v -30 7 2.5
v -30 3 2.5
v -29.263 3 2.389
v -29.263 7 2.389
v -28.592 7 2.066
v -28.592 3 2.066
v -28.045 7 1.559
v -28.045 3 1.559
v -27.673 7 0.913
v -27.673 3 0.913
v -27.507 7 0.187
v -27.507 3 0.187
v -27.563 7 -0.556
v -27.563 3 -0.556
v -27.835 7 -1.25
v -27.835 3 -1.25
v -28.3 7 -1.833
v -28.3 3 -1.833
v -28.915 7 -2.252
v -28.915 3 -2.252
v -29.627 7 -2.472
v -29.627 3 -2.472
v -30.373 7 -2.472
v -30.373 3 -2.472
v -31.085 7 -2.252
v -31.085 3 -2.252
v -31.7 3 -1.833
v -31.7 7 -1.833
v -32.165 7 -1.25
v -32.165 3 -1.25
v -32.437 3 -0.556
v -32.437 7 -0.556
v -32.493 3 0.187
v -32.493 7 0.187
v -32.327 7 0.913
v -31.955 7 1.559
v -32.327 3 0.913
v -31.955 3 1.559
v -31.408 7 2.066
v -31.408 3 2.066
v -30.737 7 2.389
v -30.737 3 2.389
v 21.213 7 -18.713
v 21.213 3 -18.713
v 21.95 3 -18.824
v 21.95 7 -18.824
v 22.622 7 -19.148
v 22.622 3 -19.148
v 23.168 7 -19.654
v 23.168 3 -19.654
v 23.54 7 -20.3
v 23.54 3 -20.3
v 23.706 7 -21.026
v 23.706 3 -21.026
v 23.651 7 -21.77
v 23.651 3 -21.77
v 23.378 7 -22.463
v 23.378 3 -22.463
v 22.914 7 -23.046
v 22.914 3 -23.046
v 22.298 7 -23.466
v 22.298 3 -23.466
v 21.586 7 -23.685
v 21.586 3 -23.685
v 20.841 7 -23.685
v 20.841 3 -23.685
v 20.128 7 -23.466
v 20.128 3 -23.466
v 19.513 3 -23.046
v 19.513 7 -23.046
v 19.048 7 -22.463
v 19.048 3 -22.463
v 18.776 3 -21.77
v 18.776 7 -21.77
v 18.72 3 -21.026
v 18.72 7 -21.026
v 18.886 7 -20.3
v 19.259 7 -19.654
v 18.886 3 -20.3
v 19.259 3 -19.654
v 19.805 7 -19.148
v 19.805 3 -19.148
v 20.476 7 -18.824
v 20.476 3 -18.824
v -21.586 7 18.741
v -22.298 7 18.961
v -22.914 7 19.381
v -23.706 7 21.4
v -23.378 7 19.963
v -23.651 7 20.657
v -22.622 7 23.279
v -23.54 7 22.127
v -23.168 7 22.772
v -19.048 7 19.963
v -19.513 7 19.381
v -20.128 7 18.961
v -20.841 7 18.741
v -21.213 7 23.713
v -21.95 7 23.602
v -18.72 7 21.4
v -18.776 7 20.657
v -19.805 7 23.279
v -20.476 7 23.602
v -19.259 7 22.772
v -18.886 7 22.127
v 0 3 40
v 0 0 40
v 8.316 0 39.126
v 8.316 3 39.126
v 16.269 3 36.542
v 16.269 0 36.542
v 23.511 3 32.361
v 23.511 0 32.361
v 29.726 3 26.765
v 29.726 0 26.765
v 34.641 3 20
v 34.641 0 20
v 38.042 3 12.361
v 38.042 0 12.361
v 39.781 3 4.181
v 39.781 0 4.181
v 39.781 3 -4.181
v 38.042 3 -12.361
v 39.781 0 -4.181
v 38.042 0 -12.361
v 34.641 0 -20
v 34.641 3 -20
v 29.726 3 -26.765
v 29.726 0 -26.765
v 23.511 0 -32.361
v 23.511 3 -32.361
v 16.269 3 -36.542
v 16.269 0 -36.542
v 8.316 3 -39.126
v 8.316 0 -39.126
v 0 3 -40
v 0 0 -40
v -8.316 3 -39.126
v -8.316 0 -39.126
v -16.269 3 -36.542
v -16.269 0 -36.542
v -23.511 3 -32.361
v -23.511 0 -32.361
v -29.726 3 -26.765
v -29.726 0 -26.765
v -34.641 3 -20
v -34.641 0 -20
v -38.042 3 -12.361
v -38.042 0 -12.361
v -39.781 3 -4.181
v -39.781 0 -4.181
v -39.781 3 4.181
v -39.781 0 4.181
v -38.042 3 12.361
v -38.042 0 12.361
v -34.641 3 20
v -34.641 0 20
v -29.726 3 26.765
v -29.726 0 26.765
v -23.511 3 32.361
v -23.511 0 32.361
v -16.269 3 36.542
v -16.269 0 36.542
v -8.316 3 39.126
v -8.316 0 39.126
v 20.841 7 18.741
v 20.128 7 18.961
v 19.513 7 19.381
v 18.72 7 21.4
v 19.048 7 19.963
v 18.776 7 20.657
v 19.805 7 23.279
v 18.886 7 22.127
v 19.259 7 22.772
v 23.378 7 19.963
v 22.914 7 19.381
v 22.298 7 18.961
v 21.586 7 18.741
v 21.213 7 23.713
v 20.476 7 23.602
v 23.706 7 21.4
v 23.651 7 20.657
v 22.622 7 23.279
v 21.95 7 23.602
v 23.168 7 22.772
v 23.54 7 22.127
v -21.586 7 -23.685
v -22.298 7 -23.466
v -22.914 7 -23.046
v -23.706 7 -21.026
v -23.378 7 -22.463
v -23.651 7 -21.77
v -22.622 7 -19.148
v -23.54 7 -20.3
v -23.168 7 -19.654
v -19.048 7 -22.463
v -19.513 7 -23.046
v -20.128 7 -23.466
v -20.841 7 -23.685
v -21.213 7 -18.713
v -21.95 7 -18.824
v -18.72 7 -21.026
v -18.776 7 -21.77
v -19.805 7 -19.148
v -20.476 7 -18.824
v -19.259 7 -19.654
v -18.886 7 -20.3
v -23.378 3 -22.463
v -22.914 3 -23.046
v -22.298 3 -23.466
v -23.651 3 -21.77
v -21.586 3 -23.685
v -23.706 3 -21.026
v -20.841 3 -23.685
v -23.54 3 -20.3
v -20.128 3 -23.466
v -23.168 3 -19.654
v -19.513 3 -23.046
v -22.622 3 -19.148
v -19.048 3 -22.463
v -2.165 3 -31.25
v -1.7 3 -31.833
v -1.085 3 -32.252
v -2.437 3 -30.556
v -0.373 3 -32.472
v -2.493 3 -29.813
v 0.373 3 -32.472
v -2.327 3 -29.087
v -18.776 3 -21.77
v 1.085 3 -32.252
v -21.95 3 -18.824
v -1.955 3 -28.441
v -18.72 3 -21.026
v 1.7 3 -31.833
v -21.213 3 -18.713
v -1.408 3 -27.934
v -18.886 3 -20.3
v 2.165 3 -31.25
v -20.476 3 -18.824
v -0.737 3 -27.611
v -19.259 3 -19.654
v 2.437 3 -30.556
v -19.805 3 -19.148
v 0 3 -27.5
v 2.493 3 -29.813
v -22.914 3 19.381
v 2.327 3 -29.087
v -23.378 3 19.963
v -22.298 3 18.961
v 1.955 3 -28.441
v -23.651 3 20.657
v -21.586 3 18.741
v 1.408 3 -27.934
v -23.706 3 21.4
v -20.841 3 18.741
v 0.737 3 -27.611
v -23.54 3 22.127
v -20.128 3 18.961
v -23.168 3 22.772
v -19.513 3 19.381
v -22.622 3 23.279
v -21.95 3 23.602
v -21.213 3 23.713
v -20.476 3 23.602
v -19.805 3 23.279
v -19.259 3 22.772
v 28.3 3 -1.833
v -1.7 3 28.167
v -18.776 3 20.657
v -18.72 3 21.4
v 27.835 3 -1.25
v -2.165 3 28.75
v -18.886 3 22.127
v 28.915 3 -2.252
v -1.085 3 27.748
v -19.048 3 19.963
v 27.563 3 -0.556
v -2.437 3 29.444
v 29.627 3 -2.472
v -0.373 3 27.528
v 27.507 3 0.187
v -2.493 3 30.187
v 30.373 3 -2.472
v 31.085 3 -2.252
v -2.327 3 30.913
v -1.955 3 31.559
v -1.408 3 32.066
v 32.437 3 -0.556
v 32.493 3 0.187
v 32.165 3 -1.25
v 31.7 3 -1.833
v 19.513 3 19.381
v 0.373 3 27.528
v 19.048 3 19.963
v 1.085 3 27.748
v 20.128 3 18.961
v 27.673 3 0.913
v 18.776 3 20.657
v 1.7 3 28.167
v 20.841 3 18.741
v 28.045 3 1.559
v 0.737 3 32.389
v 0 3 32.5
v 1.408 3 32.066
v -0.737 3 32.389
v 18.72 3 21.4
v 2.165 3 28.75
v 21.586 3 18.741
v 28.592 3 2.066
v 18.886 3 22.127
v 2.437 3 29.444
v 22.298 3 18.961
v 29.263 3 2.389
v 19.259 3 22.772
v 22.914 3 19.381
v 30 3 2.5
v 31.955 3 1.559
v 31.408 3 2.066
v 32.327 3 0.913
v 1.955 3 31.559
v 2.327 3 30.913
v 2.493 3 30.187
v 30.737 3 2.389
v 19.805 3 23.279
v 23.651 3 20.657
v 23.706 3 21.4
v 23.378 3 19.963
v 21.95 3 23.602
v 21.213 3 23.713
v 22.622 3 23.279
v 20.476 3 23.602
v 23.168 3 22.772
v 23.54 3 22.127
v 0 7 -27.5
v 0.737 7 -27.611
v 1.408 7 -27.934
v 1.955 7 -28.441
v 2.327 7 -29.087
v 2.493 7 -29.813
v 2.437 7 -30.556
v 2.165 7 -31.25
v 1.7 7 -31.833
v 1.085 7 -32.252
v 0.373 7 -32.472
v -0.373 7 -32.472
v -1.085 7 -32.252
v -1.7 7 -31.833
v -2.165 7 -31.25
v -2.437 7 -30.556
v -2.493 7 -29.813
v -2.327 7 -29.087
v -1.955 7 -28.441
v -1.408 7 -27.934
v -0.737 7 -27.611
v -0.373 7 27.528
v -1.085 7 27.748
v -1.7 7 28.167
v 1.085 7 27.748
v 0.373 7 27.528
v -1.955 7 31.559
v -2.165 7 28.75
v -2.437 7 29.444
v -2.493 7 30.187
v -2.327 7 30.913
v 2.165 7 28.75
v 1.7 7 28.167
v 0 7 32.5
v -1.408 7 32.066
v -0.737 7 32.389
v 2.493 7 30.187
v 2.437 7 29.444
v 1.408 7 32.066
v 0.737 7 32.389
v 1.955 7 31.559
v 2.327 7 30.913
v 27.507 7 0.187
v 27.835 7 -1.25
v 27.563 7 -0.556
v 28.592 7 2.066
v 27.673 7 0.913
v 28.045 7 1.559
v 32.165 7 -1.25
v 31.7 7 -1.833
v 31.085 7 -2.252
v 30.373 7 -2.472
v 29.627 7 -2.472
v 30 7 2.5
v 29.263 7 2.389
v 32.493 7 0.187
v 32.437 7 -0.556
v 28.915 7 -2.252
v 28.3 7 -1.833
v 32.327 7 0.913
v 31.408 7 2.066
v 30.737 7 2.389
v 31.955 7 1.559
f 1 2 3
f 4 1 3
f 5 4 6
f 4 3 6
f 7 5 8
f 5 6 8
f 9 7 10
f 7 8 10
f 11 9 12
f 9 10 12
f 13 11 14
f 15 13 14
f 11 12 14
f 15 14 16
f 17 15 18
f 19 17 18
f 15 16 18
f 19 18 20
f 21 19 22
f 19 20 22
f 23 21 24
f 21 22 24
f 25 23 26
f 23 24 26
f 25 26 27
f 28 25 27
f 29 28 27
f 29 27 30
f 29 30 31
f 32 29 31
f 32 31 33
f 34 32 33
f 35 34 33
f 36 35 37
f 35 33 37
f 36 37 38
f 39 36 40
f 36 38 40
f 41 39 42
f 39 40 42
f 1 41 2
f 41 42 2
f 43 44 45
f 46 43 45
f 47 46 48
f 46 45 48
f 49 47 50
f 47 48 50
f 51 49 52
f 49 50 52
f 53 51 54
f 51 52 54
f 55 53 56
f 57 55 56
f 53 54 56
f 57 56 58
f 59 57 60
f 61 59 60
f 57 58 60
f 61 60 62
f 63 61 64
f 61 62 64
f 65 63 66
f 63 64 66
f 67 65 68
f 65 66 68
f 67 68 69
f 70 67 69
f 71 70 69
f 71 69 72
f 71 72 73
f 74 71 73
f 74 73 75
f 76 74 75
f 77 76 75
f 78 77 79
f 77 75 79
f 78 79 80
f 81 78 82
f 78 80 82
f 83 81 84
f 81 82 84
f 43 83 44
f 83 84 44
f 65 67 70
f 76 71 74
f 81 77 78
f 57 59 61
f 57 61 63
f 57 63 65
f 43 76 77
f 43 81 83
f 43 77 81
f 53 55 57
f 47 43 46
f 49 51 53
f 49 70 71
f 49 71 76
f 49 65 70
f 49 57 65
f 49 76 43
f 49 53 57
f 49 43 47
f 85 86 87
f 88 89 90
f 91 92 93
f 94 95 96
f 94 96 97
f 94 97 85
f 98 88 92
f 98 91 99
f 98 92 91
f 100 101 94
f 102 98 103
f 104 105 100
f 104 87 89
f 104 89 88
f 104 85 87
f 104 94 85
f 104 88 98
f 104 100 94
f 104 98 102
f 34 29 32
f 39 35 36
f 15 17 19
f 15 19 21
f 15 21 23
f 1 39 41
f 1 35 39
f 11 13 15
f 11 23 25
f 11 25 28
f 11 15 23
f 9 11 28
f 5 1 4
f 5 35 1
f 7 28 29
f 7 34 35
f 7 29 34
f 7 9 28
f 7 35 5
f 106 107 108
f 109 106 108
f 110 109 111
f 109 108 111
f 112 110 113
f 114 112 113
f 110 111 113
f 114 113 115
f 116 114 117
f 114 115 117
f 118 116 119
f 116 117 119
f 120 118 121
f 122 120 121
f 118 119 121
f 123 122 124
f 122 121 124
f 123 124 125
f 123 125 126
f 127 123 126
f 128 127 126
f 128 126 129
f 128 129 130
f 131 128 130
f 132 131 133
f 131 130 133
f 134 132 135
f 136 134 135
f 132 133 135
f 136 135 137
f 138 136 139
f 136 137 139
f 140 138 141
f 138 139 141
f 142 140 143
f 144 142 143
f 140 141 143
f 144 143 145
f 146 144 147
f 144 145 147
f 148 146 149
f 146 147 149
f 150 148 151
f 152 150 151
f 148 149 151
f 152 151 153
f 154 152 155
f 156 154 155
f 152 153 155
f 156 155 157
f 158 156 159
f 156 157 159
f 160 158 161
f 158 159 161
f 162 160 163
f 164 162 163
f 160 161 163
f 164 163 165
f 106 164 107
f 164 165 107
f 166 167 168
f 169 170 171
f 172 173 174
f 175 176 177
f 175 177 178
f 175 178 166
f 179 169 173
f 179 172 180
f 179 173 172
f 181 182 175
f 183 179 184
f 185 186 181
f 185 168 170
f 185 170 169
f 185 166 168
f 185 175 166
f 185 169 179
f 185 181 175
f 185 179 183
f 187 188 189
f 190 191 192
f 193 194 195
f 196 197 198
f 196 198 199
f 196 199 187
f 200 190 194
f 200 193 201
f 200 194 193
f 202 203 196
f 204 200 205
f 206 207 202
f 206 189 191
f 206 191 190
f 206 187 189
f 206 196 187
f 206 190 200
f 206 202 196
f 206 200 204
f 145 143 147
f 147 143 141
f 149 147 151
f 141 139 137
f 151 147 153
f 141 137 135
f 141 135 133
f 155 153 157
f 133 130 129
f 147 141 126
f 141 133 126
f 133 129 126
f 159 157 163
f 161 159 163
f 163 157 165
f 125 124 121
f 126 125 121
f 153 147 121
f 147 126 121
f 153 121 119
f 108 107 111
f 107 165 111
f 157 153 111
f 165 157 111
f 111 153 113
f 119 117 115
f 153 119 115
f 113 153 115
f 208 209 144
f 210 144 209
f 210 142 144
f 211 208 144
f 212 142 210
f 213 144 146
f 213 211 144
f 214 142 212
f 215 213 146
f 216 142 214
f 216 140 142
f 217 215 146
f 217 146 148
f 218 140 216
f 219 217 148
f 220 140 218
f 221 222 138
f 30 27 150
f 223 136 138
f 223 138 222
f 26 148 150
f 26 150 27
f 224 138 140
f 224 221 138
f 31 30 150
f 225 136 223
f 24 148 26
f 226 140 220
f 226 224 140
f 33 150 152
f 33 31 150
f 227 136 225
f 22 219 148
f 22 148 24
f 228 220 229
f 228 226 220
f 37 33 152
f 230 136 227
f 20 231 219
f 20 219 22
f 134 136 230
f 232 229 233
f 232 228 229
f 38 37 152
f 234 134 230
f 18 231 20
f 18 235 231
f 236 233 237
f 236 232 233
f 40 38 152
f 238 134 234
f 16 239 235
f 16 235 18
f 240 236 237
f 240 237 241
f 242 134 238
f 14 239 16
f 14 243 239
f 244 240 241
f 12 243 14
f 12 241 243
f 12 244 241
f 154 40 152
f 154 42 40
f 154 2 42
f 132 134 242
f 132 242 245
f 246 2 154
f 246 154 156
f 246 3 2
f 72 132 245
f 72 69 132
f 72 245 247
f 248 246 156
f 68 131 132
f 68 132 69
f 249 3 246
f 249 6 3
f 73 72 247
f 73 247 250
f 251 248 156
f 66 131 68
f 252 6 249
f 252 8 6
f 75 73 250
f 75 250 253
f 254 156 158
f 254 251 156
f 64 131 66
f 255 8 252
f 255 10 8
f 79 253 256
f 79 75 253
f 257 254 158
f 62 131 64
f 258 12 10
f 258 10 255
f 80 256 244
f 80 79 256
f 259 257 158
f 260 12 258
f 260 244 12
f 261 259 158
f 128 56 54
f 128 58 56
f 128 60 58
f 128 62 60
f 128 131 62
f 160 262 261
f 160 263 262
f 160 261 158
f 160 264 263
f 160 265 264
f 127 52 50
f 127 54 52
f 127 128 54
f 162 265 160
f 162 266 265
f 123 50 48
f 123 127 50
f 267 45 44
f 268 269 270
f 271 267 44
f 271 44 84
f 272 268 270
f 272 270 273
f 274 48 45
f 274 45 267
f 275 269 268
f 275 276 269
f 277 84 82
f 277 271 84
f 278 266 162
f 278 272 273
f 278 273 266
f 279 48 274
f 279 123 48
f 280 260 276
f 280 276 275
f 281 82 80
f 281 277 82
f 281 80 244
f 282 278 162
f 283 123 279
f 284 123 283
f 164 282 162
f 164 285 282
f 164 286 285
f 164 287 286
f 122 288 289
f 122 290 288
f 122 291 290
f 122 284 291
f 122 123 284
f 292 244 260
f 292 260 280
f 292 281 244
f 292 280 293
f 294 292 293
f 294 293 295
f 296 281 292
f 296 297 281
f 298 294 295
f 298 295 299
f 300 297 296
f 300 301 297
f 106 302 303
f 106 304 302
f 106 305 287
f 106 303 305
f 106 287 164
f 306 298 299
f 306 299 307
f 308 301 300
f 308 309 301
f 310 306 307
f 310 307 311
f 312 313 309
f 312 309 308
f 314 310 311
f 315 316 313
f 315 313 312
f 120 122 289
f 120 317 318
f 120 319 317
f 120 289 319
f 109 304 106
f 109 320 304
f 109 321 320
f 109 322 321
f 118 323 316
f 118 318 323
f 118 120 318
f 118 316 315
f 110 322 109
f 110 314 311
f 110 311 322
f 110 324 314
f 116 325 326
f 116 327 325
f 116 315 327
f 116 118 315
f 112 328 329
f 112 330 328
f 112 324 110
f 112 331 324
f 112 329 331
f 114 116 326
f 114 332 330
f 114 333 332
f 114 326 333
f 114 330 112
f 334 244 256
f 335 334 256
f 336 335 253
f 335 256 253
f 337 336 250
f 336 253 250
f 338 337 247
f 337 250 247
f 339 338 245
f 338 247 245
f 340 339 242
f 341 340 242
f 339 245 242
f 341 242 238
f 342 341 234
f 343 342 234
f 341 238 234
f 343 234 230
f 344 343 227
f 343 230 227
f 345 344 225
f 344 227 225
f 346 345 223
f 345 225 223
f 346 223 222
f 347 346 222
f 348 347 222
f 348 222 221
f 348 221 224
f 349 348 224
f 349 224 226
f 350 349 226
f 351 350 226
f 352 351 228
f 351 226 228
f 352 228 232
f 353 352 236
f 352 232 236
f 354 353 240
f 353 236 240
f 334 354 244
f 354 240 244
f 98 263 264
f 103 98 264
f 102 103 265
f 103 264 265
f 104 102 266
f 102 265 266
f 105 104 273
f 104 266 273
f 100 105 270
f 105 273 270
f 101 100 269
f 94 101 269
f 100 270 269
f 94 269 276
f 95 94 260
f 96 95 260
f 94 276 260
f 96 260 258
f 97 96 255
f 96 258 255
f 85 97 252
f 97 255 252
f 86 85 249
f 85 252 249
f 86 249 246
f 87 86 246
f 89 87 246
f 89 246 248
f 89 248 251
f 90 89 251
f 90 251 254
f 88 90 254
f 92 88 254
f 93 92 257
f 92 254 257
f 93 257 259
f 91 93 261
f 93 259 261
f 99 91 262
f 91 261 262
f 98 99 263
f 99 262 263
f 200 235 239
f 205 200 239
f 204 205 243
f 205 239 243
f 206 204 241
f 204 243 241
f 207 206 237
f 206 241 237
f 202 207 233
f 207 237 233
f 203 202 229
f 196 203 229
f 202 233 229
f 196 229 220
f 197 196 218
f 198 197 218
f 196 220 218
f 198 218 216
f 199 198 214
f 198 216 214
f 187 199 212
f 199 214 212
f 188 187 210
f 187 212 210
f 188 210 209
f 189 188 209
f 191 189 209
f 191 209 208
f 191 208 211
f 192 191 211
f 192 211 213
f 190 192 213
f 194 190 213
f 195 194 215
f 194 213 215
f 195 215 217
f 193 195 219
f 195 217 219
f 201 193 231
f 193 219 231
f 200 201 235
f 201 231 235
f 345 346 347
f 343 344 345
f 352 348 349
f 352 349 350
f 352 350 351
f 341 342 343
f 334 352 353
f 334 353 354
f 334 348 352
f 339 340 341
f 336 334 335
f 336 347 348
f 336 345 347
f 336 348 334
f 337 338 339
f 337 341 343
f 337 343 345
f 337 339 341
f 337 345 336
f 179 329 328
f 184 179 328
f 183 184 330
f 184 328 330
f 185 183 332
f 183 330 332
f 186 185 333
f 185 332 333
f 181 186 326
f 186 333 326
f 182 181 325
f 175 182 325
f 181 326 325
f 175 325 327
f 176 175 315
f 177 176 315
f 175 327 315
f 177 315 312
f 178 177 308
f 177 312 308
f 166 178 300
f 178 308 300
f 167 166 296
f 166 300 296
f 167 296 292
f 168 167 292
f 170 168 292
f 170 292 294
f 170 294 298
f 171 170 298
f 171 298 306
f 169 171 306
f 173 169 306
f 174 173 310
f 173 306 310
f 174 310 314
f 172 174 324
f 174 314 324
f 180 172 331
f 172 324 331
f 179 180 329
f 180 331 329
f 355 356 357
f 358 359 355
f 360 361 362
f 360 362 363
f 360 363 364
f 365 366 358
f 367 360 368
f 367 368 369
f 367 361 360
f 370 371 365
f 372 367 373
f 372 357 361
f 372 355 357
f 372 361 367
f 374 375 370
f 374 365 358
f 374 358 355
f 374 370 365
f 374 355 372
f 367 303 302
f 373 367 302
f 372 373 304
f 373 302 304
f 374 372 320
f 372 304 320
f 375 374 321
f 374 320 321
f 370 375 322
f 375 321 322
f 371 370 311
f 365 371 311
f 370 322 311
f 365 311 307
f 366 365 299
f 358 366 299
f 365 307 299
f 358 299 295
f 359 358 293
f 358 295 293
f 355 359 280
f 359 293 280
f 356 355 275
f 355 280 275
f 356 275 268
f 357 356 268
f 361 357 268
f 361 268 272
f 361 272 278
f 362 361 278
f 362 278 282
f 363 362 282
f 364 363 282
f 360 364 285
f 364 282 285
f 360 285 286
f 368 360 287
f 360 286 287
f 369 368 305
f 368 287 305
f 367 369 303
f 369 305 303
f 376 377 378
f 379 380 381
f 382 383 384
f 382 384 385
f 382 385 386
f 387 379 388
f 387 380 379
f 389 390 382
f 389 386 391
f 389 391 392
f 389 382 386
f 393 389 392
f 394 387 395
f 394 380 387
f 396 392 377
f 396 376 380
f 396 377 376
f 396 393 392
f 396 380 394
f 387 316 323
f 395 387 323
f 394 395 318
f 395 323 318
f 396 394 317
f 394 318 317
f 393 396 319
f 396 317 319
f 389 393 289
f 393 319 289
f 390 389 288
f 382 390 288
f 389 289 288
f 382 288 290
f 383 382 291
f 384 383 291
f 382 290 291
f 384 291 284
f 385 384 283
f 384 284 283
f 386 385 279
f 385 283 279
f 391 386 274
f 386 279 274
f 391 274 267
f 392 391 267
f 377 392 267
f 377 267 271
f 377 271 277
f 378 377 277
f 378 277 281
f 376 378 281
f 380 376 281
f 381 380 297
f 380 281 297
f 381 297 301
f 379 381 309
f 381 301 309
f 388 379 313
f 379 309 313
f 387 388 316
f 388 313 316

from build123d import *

# Parameters (mm, degrees)
SKETCH1_R           = 40
BOSS_EXTRUDE1_DEPTH = 3
SKETCH2_R           = 2.5
BOSS_EXTRUDE2_DEPTH = 4


with BuildPart() as part:
    # Sketch1 → Boss-Extrude1 (new body)
    with BuildSketch(Plane(origin=(0, 0, 0), x_dir=(1, 0, 0), z_dir=(0, 1, 0))):
        with Locations(Location((0, 0, 0), (0, 0, 270))):
            Circle(SKETCH1_R)
    extrude(amount=BOSS_EXTRUDE1_DEPTH)

    # Sketch2 → Boss-Extrude2 (add)
    with BuildSketch(Plane(origin=(0, 3, 0), x_dir=(1, 0, 0), z_dir=(0, 1, 0))):
        with Locations(Location((0, 30, 0), (0, 0, 270))):
            Circle(SKETCH2_R)
        with Locations(Location((21.213203436, 21.213203436, 0), (0, 0, 270))):
            Circle(SKETCH2_R)
        with Locations(Location((30, 0, 0), (0, 0, 270))):
            Circle(SKETCH2_R)
        with Locations(Location((21.213203436, -21.213203436, 0), (0, 0, 270))):
            Circle(SKETCH2_R)
        with Locations(Location((0, -30, 0), (0, 0, 270))):
            Circle(SKETCH2_R)
        with Locations(Location((-21.213203436, -21.213203436, 0), (0, 0, 270))):
            Circle(SKETCH2_R)
        with Locations(Location((-30, 0, 0), (0, 0, 270))):
            Circle(SKETCH2_R)
        with Locations(Location((-21.213203436, 21.213203436, 0), (0, 0, 270))):
            Circle(SKETCH2_R)
    extrude(amount=BOSS_EXTRUDE2_DEPTH)


solid = part.part
